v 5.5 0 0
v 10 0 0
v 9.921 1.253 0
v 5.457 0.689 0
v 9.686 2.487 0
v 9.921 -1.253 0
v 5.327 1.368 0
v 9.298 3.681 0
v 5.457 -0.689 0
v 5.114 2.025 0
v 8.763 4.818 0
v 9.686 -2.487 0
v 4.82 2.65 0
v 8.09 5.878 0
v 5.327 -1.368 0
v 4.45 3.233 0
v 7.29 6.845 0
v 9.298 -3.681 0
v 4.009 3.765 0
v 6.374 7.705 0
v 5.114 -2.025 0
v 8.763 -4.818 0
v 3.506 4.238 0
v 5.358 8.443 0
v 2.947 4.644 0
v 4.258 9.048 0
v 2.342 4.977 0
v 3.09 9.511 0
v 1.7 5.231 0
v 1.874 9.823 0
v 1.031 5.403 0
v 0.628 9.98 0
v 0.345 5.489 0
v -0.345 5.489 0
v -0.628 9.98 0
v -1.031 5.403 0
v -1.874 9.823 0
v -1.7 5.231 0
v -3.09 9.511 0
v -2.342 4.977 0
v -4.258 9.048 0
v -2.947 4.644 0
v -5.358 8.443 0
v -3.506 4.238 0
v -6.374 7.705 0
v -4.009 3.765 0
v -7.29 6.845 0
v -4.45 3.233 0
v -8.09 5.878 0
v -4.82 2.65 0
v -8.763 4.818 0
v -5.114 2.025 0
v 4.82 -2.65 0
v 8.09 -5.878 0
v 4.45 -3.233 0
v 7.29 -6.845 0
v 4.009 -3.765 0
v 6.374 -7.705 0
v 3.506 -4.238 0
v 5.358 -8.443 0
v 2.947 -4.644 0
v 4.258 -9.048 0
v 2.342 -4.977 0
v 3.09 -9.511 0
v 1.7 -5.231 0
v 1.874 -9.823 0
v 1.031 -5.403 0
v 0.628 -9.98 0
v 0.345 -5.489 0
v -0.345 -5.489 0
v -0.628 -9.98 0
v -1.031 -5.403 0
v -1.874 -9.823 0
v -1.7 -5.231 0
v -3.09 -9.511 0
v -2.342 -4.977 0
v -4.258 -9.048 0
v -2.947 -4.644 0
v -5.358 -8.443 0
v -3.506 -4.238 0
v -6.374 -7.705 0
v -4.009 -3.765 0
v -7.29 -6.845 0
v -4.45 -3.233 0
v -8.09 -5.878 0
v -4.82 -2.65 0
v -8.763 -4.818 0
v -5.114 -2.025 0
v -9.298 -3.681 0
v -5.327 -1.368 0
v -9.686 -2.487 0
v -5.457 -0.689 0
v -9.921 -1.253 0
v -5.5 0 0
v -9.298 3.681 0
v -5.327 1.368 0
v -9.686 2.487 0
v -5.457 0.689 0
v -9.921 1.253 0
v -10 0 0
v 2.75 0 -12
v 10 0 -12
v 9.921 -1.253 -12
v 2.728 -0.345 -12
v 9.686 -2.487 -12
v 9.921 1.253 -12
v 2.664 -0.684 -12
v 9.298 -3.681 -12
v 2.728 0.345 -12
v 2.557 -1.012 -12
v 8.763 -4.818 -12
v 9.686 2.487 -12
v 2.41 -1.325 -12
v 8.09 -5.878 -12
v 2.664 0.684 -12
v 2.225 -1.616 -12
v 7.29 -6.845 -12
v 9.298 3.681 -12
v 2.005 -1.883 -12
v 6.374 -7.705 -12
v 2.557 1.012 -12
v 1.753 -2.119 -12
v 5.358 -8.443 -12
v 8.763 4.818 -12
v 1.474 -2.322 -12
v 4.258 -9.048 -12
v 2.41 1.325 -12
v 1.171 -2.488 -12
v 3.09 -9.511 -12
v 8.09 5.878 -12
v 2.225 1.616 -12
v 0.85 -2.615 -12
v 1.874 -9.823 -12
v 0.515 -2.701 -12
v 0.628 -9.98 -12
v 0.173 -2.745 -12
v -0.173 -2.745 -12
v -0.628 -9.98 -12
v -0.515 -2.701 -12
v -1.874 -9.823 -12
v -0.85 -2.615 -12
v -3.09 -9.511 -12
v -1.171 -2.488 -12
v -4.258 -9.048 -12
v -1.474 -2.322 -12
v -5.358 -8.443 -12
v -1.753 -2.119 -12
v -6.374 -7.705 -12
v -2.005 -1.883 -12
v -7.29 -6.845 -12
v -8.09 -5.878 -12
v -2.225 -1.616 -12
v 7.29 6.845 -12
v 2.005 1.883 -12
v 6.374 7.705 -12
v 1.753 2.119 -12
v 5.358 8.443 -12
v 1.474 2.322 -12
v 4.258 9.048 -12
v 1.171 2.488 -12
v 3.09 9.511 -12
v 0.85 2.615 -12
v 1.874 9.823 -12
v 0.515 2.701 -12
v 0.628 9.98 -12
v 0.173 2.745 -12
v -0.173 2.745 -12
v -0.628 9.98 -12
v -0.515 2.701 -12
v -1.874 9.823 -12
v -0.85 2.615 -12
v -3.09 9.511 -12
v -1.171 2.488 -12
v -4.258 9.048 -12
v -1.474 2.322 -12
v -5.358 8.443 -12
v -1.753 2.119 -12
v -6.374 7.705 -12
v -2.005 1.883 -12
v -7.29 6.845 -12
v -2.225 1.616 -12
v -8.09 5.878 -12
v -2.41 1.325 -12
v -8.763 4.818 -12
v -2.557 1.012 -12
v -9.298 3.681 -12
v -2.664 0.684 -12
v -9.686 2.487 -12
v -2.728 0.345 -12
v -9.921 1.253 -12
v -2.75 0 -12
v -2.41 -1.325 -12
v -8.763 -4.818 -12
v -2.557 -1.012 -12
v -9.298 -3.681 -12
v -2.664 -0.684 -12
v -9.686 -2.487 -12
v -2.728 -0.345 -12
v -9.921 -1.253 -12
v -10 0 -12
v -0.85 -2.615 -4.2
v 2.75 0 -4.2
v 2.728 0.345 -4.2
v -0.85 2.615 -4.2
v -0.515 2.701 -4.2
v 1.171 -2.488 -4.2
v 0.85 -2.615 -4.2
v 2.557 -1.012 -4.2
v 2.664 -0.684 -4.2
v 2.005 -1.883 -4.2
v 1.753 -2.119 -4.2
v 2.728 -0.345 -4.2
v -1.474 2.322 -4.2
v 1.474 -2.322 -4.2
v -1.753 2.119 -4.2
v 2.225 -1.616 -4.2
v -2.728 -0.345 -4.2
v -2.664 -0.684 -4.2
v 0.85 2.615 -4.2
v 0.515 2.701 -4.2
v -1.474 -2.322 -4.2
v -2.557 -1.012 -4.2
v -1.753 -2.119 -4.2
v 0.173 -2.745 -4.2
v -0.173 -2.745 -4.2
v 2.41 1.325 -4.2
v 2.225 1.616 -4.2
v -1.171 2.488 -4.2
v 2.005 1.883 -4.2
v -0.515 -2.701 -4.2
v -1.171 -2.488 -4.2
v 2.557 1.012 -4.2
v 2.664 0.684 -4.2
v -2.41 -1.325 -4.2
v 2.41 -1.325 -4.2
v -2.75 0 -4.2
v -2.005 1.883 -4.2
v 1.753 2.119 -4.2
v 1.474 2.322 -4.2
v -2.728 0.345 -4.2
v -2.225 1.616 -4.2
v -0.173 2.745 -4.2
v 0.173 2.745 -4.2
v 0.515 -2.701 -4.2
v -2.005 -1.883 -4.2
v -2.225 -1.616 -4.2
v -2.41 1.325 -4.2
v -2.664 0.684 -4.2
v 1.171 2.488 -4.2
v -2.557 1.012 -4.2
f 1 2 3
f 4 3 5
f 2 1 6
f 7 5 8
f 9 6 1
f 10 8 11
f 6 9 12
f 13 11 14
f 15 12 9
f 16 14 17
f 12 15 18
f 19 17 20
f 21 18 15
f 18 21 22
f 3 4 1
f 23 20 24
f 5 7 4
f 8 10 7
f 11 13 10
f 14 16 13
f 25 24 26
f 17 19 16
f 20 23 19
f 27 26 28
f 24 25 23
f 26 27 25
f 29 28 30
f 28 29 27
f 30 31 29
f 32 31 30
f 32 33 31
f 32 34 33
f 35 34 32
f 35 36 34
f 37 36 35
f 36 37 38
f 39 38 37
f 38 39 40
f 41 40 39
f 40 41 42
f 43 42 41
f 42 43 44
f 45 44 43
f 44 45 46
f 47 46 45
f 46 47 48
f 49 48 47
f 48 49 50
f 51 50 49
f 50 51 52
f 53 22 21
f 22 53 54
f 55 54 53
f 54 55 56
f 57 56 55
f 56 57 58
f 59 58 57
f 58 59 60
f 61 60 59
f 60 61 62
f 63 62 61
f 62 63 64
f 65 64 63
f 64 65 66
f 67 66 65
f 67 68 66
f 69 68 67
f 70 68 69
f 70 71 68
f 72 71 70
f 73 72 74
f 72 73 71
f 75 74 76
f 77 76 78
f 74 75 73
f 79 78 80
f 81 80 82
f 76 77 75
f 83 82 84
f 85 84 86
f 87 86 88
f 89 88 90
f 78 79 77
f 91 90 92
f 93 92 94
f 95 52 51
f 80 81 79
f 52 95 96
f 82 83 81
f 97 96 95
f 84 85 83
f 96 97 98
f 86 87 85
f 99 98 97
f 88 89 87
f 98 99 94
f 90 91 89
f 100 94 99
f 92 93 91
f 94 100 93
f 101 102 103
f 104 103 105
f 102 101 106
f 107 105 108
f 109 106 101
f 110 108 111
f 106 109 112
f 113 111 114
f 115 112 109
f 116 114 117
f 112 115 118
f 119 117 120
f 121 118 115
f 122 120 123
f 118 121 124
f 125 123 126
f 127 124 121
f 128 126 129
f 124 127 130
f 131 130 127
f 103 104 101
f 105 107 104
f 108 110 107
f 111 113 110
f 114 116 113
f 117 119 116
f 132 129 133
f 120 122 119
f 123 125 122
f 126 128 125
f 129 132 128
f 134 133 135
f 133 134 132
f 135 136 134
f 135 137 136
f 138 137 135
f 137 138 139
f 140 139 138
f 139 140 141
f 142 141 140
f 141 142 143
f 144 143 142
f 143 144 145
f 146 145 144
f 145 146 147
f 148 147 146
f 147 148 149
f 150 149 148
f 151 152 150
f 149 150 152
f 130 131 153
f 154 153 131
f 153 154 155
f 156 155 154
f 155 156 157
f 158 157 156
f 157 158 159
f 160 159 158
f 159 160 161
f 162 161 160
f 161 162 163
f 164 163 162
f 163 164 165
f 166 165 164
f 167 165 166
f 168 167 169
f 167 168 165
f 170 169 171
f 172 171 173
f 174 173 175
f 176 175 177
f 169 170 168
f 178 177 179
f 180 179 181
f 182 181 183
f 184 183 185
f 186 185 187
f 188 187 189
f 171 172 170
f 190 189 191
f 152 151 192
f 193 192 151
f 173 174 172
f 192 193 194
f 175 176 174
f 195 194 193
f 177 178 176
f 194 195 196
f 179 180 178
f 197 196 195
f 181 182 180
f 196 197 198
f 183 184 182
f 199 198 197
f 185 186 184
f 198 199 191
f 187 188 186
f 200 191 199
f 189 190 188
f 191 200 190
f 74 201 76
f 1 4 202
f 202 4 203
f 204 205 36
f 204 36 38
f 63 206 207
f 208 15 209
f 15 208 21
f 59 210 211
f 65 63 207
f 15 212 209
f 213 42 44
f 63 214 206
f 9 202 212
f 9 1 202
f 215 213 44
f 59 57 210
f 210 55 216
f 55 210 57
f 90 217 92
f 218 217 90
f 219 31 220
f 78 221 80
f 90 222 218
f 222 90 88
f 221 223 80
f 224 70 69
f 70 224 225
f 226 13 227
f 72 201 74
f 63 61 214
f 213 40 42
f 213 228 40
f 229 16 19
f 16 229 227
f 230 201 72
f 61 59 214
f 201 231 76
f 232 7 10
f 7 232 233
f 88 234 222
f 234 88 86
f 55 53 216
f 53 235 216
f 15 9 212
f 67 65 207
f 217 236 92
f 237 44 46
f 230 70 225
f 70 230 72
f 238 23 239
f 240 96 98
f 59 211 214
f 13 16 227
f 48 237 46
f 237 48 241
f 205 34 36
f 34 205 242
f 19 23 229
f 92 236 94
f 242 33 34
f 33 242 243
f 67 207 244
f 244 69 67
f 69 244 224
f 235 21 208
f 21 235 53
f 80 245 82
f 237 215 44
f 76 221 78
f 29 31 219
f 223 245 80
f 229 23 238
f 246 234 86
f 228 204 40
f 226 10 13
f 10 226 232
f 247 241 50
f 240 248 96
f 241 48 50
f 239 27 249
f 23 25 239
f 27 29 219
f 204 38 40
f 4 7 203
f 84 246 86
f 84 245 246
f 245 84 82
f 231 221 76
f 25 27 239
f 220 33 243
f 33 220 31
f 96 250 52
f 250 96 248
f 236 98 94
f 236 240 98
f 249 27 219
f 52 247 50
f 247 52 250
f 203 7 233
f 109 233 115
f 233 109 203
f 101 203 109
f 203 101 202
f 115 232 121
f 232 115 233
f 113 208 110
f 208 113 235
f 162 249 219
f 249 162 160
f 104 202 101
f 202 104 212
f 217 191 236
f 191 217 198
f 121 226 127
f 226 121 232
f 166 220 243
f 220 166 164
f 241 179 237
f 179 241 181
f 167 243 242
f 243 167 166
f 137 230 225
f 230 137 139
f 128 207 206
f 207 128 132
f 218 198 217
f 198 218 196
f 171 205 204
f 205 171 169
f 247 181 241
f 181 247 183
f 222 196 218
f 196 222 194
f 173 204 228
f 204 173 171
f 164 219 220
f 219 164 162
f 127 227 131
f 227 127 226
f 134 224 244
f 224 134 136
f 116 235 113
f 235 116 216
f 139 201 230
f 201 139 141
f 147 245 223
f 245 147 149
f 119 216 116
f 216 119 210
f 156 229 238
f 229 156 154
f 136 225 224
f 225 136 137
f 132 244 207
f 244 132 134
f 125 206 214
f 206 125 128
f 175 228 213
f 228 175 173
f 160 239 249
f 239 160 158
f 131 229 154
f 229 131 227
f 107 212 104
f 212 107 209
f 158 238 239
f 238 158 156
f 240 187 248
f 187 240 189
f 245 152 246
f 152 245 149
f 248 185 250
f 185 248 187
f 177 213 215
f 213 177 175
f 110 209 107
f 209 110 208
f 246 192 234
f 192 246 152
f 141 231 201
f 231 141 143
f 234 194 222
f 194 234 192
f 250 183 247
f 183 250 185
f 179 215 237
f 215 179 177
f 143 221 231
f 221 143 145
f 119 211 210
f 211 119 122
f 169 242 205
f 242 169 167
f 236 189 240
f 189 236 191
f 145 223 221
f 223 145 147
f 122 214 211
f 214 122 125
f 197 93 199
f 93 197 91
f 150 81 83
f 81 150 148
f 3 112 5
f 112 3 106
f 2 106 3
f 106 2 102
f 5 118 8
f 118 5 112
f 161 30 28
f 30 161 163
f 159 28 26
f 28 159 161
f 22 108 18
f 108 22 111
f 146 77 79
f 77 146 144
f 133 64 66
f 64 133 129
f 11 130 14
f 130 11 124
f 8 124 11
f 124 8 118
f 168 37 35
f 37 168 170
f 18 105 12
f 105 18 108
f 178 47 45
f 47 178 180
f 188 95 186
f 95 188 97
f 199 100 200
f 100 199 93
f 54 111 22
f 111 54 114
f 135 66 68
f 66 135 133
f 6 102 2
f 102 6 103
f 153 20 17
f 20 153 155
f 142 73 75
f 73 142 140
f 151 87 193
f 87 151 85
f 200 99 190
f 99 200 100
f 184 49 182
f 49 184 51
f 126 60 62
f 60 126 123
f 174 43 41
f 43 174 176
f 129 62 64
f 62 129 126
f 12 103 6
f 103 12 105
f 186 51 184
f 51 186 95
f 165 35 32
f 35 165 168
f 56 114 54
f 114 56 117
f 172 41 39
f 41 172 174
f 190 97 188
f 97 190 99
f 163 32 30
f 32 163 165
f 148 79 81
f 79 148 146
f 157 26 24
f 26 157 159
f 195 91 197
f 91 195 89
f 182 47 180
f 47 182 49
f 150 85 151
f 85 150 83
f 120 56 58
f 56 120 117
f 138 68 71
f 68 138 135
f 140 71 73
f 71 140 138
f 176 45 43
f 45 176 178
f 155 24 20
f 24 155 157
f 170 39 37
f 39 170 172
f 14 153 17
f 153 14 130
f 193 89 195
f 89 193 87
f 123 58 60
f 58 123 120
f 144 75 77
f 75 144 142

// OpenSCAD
$fn = 50;


difference() {
	union() {
		translate(v = [0, 0, -12.0000000000]) {
			cylinder(h = 12, r = 10.0000000000);
		}
		cylinder(h = 0, r = 20.0000000000);
	}
	union() {
		translate(v = [0, 0, 0]) {
			rotate(a = [0, 0, 0]) {
				difference() {
					union() {
						#translate(v = [0, 0, -12.0000000000]) {
							cylinder(h = 12, r = 2.2500000000);
						}
						#translate(v = [0, 0, -4.2000000000]) {
							cylinder(h = 4.2000000000, r = 10.0000000000, r1 = 2.7500000000, r2 = 5.5000000000);
						}
						#translate(v = [0, 0, -12.0000000000]) {
							cylinder(h = 12, r = 2.7500000000);
						}
						#translate(v = [0, 0, -12.0000000000]) {
							cylinder(h = 12, r = 2.2500000000);
						}
					}
					union();
				}
			}
		}
	}
}
